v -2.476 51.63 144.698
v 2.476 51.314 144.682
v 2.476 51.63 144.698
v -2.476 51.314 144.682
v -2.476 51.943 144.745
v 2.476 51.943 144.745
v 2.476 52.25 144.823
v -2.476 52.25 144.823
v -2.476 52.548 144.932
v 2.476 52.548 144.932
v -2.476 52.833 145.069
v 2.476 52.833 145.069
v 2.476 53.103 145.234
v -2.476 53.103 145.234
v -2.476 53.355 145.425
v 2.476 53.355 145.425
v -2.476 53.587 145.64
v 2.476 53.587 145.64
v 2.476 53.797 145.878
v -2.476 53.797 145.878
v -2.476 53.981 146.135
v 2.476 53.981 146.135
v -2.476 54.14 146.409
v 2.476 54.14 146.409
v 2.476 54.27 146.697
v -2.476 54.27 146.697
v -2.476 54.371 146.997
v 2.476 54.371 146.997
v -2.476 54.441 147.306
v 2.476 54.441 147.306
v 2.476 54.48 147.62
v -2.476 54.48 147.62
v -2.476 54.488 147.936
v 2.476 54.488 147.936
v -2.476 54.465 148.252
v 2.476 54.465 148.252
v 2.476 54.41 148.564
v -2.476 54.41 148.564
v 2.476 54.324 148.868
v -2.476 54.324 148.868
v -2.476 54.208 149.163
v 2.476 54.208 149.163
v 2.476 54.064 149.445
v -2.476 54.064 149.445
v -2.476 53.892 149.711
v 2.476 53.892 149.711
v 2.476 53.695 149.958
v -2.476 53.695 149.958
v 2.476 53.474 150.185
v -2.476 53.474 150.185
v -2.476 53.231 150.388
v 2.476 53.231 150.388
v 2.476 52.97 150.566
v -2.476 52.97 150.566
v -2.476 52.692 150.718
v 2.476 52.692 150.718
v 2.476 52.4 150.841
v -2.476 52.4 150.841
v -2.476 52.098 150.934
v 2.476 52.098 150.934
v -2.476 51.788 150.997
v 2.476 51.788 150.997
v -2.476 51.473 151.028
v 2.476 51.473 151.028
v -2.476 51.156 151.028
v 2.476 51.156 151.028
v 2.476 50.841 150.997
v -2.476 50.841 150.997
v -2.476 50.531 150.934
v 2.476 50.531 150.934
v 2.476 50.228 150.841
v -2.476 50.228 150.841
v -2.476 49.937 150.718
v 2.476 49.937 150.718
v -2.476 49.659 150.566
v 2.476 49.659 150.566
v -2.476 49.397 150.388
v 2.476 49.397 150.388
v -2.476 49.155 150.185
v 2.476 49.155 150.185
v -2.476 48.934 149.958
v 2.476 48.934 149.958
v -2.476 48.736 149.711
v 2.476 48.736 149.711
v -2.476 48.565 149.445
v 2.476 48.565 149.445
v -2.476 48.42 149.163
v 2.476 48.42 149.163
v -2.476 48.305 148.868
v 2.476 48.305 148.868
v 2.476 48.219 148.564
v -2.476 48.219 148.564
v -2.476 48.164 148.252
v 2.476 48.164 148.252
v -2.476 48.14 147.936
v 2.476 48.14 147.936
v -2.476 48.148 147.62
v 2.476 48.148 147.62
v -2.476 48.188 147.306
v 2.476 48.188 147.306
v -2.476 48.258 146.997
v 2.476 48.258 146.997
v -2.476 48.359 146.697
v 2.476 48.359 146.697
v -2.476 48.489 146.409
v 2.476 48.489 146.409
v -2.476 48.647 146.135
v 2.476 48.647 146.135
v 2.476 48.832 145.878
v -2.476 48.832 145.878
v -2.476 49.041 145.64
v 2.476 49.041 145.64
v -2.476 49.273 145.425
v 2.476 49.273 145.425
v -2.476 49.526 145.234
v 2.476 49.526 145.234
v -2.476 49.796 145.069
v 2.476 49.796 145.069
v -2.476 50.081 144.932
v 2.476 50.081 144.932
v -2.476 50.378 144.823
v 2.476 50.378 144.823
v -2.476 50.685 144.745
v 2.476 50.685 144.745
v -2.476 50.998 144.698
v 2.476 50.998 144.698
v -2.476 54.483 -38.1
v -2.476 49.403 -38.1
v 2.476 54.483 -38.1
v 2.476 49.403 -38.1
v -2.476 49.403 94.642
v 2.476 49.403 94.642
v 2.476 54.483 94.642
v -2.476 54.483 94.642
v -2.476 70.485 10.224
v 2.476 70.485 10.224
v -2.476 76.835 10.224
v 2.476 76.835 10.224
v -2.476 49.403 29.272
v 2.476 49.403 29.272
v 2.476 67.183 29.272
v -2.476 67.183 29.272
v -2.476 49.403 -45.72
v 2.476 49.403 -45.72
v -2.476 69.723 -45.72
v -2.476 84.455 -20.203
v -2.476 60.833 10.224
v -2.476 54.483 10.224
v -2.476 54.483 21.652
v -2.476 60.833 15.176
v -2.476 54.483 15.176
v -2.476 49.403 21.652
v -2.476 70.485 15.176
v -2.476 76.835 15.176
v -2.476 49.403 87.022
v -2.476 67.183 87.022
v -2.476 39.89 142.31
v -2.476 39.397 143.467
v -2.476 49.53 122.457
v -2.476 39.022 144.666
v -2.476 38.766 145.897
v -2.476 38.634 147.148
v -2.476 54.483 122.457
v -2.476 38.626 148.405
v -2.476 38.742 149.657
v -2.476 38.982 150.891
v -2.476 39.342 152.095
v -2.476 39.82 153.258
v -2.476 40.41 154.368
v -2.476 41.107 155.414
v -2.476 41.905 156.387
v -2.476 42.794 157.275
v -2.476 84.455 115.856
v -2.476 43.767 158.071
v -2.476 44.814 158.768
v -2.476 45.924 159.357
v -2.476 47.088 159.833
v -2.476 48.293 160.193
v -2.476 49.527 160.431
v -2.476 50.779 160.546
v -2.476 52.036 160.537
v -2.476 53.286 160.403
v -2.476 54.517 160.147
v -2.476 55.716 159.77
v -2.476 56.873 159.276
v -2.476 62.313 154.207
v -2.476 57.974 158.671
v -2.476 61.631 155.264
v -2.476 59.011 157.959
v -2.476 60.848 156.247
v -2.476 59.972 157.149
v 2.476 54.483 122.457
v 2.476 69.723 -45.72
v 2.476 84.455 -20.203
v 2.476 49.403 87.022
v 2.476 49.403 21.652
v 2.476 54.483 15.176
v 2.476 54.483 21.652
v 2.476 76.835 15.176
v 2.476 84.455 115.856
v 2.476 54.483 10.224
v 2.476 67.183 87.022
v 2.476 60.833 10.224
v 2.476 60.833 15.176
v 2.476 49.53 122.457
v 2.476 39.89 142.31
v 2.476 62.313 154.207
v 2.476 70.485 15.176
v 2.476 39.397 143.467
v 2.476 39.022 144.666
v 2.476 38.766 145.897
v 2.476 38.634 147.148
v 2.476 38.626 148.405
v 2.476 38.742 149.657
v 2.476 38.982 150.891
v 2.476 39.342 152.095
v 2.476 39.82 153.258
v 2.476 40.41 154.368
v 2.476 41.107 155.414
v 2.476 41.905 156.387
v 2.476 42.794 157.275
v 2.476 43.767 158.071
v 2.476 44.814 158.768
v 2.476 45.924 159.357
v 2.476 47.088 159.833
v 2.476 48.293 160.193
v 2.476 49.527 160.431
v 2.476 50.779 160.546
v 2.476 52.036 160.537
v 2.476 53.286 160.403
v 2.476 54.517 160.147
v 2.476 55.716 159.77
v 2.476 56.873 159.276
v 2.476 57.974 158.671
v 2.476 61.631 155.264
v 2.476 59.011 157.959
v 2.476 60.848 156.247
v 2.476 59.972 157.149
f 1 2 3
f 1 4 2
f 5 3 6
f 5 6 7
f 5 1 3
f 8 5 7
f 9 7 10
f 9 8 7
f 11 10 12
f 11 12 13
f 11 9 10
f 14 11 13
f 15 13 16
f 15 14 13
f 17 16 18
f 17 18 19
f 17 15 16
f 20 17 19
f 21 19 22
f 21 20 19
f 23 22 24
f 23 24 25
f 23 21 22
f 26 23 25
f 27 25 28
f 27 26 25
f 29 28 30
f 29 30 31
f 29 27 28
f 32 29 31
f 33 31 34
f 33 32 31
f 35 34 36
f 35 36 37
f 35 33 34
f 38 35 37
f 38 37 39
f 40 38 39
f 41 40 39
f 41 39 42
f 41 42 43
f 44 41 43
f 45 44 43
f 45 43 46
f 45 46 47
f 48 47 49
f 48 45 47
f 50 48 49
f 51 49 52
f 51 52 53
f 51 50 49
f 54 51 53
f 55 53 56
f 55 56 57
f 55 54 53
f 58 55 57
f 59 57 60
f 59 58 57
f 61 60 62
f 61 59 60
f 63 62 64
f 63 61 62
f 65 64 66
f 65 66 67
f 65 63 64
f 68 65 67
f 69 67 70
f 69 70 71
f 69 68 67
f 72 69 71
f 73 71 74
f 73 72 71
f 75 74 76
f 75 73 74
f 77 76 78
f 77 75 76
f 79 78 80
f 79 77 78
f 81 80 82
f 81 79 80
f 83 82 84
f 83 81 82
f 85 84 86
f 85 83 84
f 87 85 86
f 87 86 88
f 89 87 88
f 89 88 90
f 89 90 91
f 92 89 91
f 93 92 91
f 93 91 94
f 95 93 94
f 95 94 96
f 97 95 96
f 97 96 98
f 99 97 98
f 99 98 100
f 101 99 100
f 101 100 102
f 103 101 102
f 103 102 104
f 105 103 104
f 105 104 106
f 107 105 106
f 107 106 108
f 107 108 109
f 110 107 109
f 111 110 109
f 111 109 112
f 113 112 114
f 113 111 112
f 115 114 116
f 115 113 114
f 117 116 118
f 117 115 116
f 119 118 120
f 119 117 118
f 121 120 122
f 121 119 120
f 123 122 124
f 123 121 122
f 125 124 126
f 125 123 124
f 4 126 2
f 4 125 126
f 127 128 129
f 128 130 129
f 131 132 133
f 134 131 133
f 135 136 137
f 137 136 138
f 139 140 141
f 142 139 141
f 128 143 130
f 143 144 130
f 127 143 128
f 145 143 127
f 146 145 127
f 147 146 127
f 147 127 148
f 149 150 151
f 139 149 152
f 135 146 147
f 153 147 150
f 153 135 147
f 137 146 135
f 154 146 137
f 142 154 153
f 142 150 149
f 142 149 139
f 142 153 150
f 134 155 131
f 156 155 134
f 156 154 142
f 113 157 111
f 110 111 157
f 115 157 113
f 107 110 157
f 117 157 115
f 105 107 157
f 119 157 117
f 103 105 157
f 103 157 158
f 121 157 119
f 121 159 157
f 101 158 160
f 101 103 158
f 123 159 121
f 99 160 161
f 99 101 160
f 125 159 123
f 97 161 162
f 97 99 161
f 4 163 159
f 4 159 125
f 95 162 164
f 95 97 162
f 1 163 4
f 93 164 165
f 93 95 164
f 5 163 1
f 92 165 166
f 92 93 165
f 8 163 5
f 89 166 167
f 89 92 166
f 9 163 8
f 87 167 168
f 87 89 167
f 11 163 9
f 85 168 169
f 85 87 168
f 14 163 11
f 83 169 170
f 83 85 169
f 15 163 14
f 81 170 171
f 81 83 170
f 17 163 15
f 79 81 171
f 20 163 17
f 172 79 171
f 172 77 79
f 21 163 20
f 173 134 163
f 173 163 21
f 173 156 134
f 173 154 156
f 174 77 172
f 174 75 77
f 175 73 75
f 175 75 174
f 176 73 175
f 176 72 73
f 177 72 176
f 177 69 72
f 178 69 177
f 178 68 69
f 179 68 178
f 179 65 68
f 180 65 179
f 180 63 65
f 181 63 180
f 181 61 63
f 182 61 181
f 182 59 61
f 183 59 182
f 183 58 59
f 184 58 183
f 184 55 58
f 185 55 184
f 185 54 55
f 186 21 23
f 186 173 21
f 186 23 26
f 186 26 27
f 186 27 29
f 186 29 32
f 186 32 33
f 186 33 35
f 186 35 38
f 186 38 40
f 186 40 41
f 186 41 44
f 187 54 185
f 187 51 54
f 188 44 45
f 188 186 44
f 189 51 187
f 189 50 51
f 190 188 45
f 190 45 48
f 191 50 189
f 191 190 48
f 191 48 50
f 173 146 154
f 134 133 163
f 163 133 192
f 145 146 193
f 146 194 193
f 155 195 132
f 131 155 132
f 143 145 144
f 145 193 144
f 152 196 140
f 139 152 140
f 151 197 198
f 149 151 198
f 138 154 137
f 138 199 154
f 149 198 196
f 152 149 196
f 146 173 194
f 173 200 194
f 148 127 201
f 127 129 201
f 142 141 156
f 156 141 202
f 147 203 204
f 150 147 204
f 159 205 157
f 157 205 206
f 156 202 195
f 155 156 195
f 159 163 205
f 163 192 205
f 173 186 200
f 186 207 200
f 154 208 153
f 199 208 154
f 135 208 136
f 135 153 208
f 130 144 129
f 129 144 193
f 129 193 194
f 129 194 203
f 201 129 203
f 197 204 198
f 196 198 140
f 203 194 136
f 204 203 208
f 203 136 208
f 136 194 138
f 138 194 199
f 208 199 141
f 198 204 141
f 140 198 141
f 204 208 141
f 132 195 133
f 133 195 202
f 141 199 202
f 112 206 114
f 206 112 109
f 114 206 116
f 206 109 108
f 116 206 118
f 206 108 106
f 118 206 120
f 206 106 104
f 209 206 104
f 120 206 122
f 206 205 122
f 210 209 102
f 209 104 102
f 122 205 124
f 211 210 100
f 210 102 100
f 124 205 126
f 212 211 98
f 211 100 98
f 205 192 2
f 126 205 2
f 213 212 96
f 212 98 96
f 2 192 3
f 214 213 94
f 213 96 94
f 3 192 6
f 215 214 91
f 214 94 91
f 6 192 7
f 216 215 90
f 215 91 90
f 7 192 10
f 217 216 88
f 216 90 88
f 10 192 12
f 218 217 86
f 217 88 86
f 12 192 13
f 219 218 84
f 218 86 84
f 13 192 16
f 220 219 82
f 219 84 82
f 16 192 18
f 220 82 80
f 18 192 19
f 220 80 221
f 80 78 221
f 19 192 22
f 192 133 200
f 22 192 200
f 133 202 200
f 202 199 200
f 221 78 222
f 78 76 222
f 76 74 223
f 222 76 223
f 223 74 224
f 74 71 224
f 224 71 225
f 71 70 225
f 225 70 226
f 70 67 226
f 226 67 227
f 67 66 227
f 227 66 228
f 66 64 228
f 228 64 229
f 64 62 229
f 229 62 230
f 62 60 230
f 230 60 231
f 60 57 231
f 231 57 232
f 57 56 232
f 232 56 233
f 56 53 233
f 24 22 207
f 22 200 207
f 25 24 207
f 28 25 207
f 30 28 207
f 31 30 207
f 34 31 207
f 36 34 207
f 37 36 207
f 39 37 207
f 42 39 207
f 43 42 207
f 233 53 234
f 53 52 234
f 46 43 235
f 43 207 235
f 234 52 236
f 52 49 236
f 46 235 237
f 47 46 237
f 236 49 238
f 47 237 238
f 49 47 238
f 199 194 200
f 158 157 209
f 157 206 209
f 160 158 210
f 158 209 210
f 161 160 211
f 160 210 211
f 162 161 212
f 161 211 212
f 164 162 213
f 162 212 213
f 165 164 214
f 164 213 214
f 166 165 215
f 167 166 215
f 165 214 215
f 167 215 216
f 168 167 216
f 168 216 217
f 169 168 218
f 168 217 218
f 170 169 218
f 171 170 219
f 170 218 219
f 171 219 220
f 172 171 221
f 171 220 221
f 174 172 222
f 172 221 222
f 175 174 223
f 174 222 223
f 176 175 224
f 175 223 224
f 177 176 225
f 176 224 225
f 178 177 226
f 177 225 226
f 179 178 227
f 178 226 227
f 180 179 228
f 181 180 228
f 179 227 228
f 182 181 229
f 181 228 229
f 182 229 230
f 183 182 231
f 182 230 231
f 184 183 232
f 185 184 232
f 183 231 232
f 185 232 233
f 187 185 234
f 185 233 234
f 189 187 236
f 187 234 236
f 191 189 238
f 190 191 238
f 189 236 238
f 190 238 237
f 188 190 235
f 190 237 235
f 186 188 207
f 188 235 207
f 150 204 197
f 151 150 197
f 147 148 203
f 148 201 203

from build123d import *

# Parameters (mm, degrees)
SKETCH1_R           = 3.175
SKETCH1_W           = 4.953
SKETCH1_H           = 6.35
BOSS_EXTRUDE1_DEPTH = 2.4765


with BuildPart() as part:
    # Sketch1 → Boss-Extrude1 (new, symmetric)
    with BuildSketch(Plane(origin=(0, 0, 0), x_dir=(0, 0, -1), z_dir=(1, 0, 0))):
        with BuildLine():
            Line((-94.642365809, 54.483), (-122.457292876, 54.483))
            Line((-122.457292876, 54.483), (-122.457292876, 49.53))
            Line((-122.457292876, 49.53), (-142.309833129, 39.889958968))
            ThreePointArc((-142.309833129, 39.889958968), (-159.075906045, 45.361766519), (-154.207292876, 62.312827982))
            Line((-154.207292876, 62.312827982), (-115.855925951, 84.455))
            Line((-115.855925951, 84.455), (20.203427503, 84.455))
            Line((20.203427503, 84.455), (45.72, 69.723))
            Line((45.72, 69.723), (45.72, 49.403))
            Line((45.72, 49.403), (38.1, 49.403))
            Line((38.1, 49.403), (38.1, 54.483))
            Line((38.1, 54.483), (-10.2235, 54.483))
            Line((-10.2235, 54.483), (-10.2235, 60.833))
            Line((-10.2235, 60.833), (-15.1765, 60.833))
            Line((-15.1765, 60.833), (-15.1765, 54.483))
            Line((-15.1765, 54.483), (-21.651856626, 54.483))
            Line((-21.651856626, 54.483), (-21.651856626, 49.403))
            Line((-21.651856626, 49.403), (-29.271856626, 49.403))
            Line((-29.271856626, 49.403), (-29.271856626, 67.183))
            Line((-29.271856626, 67.183), (-87.022365809, 67.183))
            Line((-87.022365809, 67.183), (-87.022365809, 49.403))
            Line((-87.022365809, 49.403), (-94.642365809, 49.403))
            Line((-94.642365809, 49.403), (-94.642365809, 54.483))
        make_face()
        with Locations((-147.857292876, 51.314305354)):
            Circle(SKETCH1_R, mode=Mode.SUBTRACT)
        with Locations((-12.7, 73.66)):
            Rectangle(SKETCH1_W, SKETCH1_H, mode=Mode.SUBTRACT)
    extrude(amount=BOSS_EXTRUDE1_DEPTH, both=True)


solid = part.part
